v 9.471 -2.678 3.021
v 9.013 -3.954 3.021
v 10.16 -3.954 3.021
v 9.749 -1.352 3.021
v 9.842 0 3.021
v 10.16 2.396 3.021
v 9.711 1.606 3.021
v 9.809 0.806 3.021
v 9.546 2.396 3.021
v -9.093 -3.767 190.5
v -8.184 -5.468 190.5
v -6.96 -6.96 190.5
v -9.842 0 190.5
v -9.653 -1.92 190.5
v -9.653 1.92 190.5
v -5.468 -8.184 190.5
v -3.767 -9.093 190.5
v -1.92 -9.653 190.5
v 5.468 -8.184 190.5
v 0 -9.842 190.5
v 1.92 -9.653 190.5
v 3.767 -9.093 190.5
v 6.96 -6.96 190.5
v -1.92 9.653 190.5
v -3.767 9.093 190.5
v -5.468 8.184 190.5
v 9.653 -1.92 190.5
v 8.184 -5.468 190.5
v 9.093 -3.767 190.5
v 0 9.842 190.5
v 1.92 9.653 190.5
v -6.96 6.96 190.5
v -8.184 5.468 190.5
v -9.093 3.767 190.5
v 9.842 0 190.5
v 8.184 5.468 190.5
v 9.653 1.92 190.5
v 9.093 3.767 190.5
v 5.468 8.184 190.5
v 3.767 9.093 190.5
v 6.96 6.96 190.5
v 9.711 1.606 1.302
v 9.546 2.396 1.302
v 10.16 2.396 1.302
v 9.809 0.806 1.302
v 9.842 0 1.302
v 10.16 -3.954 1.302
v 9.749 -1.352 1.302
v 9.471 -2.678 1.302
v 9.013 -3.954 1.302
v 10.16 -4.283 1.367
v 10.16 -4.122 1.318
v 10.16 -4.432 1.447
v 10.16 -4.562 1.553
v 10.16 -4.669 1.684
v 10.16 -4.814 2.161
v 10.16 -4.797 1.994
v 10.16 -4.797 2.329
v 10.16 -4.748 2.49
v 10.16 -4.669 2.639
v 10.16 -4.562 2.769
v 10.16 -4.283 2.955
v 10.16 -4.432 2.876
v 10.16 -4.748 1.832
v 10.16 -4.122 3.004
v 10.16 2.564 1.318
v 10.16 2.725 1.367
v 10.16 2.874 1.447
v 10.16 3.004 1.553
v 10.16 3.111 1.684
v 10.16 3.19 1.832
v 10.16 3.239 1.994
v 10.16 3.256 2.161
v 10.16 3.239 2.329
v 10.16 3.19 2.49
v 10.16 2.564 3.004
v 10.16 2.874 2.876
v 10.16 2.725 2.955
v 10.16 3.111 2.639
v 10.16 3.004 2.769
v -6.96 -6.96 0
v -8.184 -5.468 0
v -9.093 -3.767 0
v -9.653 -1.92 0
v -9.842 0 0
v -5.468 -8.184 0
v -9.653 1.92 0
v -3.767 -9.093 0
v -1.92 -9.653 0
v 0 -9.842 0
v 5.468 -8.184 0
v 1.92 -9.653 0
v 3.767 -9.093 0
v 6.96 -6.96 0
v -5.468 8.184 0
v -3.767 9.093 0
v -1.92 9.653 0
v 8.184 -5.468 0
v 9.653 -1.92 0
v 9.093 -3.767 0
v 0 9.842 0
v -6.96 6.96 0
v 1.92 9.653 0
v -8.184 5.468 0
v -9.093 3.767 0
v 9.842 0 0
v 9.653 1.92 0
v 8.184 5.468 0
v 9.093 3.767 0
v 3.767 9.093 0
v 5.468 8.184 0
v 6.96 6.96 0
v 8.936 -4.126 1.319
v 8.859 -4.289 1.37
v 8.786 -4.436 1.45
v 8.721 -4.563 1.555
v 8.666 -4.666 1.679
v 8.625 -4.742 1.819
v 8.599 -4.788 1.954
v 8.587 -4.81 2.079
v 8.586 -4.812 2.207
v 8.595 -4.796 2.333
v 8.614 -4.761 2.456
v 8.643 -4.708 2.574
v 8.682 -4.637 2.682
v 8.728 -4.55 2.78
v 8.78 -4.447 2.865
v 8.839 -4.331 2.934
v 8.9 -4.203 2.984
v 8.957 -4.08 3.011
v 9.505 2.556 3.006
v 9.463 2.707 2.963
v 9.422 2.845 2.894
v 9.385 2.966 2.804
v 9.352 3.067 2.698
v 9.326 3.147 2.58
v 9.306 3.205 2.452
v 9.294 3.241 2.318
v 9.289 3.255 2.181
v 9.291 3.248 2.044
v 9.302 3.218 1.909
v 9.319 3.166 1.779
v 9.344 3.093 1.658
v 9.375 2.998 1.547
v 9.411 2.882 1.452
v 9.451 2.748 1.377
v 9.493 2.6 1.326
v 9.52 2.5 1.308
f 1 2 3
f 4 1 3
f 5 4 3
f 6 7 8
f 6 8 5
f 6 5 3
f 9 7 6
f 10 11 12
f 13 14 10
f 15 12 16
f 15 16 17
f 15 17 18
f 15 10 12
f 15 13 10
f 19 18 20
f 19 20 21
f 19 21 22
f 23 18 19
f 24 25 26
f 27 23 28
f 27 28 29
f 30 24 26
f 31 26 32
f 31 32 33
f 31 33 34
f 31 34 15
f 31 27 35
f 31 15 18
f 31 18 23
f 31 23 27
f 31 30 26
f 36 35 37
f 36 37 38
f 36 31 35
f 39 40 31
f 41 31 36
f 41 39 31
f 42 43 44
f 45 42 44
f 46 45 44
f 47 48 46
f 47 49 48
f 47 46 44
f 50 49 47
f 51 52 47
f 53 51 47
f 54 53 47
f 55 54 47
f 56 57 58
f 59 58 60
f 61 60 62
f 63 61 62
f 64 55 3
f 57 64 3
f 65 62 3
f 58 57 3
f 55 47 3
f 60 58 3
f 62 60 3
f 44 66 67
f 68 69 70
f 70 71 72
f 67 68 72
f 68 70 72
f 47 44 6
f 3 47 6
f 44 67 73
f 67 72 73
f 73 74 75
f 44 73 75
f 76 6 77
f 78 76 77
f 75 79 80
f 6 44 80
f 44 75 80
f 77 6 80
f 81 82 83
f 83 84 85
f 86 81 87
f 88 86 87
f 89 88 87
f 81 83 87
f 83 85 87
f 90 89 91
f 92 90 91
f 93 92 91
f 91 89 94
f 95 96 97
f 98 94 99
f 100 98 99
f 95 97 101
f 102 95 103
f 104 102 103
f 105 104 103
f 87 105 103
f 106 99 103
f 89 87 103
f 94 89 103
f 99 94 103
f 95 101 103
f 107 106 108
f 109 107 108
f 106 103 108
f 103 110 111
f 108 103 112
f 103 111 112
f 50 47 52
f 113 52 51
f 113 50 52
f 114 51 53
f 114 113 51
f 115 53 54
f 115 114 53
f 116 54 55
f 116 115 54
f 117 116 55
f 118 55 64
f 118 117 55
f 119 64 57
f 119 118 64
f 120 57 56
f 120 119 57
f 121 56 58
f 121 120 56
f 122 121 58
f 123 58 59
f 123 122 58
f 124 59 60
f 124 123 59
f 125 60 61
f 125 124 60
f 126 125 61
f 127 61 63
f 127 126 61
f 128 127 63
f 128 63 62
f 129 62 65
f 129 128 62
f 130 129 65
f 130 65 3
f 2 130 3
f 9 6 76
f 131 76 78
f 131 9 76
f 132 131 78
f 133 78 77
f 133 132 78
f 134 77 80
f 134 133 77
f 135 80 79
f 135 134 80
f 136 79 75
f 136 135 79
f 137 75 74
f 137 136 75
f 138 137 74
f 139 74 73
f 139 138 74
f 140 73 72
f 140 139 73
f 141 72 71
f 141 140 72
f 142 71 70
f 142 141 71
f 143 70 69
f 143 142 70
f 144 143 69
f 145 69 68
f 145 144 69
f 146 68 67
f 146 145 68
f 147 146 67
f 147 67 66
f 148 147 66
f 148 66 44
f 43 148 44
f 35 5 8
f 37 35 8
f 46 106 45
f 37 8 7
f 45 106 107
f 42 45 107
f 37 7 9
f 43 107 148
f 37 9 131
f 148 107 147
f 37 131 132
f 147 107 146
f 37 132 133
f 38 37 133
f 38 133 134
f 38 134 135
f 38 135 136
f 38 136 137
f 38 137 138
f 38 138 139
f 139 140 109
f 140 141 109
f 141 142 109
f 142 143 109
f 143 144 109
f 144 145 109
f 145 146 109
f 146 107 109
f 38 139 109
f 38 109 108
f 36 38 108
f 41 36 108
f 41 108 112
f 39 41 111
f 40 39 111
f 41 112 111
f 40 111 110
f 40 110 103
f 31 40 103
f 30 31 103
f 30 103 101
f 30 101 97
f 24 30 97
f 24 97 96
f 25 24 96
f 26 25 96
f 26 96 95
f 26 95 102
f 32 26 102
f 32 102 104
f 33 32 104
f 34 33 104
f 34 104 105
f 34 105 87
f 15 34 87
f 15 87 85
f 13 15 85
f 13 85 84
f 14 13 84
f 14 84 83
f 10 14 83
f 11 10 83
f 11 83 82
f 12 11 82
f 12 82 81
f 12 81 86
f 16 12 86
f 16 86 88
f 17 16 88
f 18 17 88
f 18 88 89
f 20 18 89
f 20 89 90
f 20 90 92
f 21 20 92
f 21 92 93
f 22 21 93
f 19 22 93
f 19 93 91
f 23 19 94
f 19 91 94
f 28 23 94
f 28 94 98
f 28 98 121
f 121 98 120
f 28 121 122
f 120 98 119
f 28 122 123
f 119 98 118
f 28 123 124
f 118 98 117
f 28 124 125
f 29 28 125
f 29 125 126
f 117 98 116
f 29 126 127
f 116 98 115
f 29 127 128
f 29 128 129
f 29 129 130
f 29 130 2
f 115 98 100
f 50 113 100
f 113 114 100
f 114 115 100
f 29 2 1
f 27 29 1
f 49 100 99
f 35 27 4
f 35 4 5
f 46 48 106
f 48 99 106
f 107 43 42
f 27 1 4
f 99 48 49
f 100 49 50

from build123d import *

# Parameters (mm, degrees)
SKETCH1_R           = 9.8425
BOSS_EXTRUDE1_DEPTH = 190.5
BOSS_EXTRUDE6_DEPTH = 10.16


with BuildPart() as part:
    # Sketch1 → Boss-Extrude1 (new body)
    with BuildSketch(Plane.XY):
        Circle(SKETCH1_R)
    extrude(amount=BOSS_EXTRUDE1_DEPTH)

    # Sketch6 → Boss-Extrude6 (add)
    with BuildSketch(Plane(origin=(0, 0, 0), x_dir=(0, 0, -1), z_dir=(1, 0, 0))):
        with BuildLine():
            Line((-1.301661294, 2.396009349), (-1.301661294, -3.953990651))
            ThreePointArc((-1.301661294, -3.953990651), (-2.161224479, -4.813553836), (-3.020787664, -3.953990651))
            Line((-3.020787664, -3.953990651), (-3.020787664, 2.396009349))
            ThreePointArc((-3.020787664, 2.396009349), (-2.161224479, 3.255572534), (-1.301661294, 2.396009349))
        make_face()
    extrude(amount=BOSS_EXTRUDE6_DEPTH)


solid = part.part
